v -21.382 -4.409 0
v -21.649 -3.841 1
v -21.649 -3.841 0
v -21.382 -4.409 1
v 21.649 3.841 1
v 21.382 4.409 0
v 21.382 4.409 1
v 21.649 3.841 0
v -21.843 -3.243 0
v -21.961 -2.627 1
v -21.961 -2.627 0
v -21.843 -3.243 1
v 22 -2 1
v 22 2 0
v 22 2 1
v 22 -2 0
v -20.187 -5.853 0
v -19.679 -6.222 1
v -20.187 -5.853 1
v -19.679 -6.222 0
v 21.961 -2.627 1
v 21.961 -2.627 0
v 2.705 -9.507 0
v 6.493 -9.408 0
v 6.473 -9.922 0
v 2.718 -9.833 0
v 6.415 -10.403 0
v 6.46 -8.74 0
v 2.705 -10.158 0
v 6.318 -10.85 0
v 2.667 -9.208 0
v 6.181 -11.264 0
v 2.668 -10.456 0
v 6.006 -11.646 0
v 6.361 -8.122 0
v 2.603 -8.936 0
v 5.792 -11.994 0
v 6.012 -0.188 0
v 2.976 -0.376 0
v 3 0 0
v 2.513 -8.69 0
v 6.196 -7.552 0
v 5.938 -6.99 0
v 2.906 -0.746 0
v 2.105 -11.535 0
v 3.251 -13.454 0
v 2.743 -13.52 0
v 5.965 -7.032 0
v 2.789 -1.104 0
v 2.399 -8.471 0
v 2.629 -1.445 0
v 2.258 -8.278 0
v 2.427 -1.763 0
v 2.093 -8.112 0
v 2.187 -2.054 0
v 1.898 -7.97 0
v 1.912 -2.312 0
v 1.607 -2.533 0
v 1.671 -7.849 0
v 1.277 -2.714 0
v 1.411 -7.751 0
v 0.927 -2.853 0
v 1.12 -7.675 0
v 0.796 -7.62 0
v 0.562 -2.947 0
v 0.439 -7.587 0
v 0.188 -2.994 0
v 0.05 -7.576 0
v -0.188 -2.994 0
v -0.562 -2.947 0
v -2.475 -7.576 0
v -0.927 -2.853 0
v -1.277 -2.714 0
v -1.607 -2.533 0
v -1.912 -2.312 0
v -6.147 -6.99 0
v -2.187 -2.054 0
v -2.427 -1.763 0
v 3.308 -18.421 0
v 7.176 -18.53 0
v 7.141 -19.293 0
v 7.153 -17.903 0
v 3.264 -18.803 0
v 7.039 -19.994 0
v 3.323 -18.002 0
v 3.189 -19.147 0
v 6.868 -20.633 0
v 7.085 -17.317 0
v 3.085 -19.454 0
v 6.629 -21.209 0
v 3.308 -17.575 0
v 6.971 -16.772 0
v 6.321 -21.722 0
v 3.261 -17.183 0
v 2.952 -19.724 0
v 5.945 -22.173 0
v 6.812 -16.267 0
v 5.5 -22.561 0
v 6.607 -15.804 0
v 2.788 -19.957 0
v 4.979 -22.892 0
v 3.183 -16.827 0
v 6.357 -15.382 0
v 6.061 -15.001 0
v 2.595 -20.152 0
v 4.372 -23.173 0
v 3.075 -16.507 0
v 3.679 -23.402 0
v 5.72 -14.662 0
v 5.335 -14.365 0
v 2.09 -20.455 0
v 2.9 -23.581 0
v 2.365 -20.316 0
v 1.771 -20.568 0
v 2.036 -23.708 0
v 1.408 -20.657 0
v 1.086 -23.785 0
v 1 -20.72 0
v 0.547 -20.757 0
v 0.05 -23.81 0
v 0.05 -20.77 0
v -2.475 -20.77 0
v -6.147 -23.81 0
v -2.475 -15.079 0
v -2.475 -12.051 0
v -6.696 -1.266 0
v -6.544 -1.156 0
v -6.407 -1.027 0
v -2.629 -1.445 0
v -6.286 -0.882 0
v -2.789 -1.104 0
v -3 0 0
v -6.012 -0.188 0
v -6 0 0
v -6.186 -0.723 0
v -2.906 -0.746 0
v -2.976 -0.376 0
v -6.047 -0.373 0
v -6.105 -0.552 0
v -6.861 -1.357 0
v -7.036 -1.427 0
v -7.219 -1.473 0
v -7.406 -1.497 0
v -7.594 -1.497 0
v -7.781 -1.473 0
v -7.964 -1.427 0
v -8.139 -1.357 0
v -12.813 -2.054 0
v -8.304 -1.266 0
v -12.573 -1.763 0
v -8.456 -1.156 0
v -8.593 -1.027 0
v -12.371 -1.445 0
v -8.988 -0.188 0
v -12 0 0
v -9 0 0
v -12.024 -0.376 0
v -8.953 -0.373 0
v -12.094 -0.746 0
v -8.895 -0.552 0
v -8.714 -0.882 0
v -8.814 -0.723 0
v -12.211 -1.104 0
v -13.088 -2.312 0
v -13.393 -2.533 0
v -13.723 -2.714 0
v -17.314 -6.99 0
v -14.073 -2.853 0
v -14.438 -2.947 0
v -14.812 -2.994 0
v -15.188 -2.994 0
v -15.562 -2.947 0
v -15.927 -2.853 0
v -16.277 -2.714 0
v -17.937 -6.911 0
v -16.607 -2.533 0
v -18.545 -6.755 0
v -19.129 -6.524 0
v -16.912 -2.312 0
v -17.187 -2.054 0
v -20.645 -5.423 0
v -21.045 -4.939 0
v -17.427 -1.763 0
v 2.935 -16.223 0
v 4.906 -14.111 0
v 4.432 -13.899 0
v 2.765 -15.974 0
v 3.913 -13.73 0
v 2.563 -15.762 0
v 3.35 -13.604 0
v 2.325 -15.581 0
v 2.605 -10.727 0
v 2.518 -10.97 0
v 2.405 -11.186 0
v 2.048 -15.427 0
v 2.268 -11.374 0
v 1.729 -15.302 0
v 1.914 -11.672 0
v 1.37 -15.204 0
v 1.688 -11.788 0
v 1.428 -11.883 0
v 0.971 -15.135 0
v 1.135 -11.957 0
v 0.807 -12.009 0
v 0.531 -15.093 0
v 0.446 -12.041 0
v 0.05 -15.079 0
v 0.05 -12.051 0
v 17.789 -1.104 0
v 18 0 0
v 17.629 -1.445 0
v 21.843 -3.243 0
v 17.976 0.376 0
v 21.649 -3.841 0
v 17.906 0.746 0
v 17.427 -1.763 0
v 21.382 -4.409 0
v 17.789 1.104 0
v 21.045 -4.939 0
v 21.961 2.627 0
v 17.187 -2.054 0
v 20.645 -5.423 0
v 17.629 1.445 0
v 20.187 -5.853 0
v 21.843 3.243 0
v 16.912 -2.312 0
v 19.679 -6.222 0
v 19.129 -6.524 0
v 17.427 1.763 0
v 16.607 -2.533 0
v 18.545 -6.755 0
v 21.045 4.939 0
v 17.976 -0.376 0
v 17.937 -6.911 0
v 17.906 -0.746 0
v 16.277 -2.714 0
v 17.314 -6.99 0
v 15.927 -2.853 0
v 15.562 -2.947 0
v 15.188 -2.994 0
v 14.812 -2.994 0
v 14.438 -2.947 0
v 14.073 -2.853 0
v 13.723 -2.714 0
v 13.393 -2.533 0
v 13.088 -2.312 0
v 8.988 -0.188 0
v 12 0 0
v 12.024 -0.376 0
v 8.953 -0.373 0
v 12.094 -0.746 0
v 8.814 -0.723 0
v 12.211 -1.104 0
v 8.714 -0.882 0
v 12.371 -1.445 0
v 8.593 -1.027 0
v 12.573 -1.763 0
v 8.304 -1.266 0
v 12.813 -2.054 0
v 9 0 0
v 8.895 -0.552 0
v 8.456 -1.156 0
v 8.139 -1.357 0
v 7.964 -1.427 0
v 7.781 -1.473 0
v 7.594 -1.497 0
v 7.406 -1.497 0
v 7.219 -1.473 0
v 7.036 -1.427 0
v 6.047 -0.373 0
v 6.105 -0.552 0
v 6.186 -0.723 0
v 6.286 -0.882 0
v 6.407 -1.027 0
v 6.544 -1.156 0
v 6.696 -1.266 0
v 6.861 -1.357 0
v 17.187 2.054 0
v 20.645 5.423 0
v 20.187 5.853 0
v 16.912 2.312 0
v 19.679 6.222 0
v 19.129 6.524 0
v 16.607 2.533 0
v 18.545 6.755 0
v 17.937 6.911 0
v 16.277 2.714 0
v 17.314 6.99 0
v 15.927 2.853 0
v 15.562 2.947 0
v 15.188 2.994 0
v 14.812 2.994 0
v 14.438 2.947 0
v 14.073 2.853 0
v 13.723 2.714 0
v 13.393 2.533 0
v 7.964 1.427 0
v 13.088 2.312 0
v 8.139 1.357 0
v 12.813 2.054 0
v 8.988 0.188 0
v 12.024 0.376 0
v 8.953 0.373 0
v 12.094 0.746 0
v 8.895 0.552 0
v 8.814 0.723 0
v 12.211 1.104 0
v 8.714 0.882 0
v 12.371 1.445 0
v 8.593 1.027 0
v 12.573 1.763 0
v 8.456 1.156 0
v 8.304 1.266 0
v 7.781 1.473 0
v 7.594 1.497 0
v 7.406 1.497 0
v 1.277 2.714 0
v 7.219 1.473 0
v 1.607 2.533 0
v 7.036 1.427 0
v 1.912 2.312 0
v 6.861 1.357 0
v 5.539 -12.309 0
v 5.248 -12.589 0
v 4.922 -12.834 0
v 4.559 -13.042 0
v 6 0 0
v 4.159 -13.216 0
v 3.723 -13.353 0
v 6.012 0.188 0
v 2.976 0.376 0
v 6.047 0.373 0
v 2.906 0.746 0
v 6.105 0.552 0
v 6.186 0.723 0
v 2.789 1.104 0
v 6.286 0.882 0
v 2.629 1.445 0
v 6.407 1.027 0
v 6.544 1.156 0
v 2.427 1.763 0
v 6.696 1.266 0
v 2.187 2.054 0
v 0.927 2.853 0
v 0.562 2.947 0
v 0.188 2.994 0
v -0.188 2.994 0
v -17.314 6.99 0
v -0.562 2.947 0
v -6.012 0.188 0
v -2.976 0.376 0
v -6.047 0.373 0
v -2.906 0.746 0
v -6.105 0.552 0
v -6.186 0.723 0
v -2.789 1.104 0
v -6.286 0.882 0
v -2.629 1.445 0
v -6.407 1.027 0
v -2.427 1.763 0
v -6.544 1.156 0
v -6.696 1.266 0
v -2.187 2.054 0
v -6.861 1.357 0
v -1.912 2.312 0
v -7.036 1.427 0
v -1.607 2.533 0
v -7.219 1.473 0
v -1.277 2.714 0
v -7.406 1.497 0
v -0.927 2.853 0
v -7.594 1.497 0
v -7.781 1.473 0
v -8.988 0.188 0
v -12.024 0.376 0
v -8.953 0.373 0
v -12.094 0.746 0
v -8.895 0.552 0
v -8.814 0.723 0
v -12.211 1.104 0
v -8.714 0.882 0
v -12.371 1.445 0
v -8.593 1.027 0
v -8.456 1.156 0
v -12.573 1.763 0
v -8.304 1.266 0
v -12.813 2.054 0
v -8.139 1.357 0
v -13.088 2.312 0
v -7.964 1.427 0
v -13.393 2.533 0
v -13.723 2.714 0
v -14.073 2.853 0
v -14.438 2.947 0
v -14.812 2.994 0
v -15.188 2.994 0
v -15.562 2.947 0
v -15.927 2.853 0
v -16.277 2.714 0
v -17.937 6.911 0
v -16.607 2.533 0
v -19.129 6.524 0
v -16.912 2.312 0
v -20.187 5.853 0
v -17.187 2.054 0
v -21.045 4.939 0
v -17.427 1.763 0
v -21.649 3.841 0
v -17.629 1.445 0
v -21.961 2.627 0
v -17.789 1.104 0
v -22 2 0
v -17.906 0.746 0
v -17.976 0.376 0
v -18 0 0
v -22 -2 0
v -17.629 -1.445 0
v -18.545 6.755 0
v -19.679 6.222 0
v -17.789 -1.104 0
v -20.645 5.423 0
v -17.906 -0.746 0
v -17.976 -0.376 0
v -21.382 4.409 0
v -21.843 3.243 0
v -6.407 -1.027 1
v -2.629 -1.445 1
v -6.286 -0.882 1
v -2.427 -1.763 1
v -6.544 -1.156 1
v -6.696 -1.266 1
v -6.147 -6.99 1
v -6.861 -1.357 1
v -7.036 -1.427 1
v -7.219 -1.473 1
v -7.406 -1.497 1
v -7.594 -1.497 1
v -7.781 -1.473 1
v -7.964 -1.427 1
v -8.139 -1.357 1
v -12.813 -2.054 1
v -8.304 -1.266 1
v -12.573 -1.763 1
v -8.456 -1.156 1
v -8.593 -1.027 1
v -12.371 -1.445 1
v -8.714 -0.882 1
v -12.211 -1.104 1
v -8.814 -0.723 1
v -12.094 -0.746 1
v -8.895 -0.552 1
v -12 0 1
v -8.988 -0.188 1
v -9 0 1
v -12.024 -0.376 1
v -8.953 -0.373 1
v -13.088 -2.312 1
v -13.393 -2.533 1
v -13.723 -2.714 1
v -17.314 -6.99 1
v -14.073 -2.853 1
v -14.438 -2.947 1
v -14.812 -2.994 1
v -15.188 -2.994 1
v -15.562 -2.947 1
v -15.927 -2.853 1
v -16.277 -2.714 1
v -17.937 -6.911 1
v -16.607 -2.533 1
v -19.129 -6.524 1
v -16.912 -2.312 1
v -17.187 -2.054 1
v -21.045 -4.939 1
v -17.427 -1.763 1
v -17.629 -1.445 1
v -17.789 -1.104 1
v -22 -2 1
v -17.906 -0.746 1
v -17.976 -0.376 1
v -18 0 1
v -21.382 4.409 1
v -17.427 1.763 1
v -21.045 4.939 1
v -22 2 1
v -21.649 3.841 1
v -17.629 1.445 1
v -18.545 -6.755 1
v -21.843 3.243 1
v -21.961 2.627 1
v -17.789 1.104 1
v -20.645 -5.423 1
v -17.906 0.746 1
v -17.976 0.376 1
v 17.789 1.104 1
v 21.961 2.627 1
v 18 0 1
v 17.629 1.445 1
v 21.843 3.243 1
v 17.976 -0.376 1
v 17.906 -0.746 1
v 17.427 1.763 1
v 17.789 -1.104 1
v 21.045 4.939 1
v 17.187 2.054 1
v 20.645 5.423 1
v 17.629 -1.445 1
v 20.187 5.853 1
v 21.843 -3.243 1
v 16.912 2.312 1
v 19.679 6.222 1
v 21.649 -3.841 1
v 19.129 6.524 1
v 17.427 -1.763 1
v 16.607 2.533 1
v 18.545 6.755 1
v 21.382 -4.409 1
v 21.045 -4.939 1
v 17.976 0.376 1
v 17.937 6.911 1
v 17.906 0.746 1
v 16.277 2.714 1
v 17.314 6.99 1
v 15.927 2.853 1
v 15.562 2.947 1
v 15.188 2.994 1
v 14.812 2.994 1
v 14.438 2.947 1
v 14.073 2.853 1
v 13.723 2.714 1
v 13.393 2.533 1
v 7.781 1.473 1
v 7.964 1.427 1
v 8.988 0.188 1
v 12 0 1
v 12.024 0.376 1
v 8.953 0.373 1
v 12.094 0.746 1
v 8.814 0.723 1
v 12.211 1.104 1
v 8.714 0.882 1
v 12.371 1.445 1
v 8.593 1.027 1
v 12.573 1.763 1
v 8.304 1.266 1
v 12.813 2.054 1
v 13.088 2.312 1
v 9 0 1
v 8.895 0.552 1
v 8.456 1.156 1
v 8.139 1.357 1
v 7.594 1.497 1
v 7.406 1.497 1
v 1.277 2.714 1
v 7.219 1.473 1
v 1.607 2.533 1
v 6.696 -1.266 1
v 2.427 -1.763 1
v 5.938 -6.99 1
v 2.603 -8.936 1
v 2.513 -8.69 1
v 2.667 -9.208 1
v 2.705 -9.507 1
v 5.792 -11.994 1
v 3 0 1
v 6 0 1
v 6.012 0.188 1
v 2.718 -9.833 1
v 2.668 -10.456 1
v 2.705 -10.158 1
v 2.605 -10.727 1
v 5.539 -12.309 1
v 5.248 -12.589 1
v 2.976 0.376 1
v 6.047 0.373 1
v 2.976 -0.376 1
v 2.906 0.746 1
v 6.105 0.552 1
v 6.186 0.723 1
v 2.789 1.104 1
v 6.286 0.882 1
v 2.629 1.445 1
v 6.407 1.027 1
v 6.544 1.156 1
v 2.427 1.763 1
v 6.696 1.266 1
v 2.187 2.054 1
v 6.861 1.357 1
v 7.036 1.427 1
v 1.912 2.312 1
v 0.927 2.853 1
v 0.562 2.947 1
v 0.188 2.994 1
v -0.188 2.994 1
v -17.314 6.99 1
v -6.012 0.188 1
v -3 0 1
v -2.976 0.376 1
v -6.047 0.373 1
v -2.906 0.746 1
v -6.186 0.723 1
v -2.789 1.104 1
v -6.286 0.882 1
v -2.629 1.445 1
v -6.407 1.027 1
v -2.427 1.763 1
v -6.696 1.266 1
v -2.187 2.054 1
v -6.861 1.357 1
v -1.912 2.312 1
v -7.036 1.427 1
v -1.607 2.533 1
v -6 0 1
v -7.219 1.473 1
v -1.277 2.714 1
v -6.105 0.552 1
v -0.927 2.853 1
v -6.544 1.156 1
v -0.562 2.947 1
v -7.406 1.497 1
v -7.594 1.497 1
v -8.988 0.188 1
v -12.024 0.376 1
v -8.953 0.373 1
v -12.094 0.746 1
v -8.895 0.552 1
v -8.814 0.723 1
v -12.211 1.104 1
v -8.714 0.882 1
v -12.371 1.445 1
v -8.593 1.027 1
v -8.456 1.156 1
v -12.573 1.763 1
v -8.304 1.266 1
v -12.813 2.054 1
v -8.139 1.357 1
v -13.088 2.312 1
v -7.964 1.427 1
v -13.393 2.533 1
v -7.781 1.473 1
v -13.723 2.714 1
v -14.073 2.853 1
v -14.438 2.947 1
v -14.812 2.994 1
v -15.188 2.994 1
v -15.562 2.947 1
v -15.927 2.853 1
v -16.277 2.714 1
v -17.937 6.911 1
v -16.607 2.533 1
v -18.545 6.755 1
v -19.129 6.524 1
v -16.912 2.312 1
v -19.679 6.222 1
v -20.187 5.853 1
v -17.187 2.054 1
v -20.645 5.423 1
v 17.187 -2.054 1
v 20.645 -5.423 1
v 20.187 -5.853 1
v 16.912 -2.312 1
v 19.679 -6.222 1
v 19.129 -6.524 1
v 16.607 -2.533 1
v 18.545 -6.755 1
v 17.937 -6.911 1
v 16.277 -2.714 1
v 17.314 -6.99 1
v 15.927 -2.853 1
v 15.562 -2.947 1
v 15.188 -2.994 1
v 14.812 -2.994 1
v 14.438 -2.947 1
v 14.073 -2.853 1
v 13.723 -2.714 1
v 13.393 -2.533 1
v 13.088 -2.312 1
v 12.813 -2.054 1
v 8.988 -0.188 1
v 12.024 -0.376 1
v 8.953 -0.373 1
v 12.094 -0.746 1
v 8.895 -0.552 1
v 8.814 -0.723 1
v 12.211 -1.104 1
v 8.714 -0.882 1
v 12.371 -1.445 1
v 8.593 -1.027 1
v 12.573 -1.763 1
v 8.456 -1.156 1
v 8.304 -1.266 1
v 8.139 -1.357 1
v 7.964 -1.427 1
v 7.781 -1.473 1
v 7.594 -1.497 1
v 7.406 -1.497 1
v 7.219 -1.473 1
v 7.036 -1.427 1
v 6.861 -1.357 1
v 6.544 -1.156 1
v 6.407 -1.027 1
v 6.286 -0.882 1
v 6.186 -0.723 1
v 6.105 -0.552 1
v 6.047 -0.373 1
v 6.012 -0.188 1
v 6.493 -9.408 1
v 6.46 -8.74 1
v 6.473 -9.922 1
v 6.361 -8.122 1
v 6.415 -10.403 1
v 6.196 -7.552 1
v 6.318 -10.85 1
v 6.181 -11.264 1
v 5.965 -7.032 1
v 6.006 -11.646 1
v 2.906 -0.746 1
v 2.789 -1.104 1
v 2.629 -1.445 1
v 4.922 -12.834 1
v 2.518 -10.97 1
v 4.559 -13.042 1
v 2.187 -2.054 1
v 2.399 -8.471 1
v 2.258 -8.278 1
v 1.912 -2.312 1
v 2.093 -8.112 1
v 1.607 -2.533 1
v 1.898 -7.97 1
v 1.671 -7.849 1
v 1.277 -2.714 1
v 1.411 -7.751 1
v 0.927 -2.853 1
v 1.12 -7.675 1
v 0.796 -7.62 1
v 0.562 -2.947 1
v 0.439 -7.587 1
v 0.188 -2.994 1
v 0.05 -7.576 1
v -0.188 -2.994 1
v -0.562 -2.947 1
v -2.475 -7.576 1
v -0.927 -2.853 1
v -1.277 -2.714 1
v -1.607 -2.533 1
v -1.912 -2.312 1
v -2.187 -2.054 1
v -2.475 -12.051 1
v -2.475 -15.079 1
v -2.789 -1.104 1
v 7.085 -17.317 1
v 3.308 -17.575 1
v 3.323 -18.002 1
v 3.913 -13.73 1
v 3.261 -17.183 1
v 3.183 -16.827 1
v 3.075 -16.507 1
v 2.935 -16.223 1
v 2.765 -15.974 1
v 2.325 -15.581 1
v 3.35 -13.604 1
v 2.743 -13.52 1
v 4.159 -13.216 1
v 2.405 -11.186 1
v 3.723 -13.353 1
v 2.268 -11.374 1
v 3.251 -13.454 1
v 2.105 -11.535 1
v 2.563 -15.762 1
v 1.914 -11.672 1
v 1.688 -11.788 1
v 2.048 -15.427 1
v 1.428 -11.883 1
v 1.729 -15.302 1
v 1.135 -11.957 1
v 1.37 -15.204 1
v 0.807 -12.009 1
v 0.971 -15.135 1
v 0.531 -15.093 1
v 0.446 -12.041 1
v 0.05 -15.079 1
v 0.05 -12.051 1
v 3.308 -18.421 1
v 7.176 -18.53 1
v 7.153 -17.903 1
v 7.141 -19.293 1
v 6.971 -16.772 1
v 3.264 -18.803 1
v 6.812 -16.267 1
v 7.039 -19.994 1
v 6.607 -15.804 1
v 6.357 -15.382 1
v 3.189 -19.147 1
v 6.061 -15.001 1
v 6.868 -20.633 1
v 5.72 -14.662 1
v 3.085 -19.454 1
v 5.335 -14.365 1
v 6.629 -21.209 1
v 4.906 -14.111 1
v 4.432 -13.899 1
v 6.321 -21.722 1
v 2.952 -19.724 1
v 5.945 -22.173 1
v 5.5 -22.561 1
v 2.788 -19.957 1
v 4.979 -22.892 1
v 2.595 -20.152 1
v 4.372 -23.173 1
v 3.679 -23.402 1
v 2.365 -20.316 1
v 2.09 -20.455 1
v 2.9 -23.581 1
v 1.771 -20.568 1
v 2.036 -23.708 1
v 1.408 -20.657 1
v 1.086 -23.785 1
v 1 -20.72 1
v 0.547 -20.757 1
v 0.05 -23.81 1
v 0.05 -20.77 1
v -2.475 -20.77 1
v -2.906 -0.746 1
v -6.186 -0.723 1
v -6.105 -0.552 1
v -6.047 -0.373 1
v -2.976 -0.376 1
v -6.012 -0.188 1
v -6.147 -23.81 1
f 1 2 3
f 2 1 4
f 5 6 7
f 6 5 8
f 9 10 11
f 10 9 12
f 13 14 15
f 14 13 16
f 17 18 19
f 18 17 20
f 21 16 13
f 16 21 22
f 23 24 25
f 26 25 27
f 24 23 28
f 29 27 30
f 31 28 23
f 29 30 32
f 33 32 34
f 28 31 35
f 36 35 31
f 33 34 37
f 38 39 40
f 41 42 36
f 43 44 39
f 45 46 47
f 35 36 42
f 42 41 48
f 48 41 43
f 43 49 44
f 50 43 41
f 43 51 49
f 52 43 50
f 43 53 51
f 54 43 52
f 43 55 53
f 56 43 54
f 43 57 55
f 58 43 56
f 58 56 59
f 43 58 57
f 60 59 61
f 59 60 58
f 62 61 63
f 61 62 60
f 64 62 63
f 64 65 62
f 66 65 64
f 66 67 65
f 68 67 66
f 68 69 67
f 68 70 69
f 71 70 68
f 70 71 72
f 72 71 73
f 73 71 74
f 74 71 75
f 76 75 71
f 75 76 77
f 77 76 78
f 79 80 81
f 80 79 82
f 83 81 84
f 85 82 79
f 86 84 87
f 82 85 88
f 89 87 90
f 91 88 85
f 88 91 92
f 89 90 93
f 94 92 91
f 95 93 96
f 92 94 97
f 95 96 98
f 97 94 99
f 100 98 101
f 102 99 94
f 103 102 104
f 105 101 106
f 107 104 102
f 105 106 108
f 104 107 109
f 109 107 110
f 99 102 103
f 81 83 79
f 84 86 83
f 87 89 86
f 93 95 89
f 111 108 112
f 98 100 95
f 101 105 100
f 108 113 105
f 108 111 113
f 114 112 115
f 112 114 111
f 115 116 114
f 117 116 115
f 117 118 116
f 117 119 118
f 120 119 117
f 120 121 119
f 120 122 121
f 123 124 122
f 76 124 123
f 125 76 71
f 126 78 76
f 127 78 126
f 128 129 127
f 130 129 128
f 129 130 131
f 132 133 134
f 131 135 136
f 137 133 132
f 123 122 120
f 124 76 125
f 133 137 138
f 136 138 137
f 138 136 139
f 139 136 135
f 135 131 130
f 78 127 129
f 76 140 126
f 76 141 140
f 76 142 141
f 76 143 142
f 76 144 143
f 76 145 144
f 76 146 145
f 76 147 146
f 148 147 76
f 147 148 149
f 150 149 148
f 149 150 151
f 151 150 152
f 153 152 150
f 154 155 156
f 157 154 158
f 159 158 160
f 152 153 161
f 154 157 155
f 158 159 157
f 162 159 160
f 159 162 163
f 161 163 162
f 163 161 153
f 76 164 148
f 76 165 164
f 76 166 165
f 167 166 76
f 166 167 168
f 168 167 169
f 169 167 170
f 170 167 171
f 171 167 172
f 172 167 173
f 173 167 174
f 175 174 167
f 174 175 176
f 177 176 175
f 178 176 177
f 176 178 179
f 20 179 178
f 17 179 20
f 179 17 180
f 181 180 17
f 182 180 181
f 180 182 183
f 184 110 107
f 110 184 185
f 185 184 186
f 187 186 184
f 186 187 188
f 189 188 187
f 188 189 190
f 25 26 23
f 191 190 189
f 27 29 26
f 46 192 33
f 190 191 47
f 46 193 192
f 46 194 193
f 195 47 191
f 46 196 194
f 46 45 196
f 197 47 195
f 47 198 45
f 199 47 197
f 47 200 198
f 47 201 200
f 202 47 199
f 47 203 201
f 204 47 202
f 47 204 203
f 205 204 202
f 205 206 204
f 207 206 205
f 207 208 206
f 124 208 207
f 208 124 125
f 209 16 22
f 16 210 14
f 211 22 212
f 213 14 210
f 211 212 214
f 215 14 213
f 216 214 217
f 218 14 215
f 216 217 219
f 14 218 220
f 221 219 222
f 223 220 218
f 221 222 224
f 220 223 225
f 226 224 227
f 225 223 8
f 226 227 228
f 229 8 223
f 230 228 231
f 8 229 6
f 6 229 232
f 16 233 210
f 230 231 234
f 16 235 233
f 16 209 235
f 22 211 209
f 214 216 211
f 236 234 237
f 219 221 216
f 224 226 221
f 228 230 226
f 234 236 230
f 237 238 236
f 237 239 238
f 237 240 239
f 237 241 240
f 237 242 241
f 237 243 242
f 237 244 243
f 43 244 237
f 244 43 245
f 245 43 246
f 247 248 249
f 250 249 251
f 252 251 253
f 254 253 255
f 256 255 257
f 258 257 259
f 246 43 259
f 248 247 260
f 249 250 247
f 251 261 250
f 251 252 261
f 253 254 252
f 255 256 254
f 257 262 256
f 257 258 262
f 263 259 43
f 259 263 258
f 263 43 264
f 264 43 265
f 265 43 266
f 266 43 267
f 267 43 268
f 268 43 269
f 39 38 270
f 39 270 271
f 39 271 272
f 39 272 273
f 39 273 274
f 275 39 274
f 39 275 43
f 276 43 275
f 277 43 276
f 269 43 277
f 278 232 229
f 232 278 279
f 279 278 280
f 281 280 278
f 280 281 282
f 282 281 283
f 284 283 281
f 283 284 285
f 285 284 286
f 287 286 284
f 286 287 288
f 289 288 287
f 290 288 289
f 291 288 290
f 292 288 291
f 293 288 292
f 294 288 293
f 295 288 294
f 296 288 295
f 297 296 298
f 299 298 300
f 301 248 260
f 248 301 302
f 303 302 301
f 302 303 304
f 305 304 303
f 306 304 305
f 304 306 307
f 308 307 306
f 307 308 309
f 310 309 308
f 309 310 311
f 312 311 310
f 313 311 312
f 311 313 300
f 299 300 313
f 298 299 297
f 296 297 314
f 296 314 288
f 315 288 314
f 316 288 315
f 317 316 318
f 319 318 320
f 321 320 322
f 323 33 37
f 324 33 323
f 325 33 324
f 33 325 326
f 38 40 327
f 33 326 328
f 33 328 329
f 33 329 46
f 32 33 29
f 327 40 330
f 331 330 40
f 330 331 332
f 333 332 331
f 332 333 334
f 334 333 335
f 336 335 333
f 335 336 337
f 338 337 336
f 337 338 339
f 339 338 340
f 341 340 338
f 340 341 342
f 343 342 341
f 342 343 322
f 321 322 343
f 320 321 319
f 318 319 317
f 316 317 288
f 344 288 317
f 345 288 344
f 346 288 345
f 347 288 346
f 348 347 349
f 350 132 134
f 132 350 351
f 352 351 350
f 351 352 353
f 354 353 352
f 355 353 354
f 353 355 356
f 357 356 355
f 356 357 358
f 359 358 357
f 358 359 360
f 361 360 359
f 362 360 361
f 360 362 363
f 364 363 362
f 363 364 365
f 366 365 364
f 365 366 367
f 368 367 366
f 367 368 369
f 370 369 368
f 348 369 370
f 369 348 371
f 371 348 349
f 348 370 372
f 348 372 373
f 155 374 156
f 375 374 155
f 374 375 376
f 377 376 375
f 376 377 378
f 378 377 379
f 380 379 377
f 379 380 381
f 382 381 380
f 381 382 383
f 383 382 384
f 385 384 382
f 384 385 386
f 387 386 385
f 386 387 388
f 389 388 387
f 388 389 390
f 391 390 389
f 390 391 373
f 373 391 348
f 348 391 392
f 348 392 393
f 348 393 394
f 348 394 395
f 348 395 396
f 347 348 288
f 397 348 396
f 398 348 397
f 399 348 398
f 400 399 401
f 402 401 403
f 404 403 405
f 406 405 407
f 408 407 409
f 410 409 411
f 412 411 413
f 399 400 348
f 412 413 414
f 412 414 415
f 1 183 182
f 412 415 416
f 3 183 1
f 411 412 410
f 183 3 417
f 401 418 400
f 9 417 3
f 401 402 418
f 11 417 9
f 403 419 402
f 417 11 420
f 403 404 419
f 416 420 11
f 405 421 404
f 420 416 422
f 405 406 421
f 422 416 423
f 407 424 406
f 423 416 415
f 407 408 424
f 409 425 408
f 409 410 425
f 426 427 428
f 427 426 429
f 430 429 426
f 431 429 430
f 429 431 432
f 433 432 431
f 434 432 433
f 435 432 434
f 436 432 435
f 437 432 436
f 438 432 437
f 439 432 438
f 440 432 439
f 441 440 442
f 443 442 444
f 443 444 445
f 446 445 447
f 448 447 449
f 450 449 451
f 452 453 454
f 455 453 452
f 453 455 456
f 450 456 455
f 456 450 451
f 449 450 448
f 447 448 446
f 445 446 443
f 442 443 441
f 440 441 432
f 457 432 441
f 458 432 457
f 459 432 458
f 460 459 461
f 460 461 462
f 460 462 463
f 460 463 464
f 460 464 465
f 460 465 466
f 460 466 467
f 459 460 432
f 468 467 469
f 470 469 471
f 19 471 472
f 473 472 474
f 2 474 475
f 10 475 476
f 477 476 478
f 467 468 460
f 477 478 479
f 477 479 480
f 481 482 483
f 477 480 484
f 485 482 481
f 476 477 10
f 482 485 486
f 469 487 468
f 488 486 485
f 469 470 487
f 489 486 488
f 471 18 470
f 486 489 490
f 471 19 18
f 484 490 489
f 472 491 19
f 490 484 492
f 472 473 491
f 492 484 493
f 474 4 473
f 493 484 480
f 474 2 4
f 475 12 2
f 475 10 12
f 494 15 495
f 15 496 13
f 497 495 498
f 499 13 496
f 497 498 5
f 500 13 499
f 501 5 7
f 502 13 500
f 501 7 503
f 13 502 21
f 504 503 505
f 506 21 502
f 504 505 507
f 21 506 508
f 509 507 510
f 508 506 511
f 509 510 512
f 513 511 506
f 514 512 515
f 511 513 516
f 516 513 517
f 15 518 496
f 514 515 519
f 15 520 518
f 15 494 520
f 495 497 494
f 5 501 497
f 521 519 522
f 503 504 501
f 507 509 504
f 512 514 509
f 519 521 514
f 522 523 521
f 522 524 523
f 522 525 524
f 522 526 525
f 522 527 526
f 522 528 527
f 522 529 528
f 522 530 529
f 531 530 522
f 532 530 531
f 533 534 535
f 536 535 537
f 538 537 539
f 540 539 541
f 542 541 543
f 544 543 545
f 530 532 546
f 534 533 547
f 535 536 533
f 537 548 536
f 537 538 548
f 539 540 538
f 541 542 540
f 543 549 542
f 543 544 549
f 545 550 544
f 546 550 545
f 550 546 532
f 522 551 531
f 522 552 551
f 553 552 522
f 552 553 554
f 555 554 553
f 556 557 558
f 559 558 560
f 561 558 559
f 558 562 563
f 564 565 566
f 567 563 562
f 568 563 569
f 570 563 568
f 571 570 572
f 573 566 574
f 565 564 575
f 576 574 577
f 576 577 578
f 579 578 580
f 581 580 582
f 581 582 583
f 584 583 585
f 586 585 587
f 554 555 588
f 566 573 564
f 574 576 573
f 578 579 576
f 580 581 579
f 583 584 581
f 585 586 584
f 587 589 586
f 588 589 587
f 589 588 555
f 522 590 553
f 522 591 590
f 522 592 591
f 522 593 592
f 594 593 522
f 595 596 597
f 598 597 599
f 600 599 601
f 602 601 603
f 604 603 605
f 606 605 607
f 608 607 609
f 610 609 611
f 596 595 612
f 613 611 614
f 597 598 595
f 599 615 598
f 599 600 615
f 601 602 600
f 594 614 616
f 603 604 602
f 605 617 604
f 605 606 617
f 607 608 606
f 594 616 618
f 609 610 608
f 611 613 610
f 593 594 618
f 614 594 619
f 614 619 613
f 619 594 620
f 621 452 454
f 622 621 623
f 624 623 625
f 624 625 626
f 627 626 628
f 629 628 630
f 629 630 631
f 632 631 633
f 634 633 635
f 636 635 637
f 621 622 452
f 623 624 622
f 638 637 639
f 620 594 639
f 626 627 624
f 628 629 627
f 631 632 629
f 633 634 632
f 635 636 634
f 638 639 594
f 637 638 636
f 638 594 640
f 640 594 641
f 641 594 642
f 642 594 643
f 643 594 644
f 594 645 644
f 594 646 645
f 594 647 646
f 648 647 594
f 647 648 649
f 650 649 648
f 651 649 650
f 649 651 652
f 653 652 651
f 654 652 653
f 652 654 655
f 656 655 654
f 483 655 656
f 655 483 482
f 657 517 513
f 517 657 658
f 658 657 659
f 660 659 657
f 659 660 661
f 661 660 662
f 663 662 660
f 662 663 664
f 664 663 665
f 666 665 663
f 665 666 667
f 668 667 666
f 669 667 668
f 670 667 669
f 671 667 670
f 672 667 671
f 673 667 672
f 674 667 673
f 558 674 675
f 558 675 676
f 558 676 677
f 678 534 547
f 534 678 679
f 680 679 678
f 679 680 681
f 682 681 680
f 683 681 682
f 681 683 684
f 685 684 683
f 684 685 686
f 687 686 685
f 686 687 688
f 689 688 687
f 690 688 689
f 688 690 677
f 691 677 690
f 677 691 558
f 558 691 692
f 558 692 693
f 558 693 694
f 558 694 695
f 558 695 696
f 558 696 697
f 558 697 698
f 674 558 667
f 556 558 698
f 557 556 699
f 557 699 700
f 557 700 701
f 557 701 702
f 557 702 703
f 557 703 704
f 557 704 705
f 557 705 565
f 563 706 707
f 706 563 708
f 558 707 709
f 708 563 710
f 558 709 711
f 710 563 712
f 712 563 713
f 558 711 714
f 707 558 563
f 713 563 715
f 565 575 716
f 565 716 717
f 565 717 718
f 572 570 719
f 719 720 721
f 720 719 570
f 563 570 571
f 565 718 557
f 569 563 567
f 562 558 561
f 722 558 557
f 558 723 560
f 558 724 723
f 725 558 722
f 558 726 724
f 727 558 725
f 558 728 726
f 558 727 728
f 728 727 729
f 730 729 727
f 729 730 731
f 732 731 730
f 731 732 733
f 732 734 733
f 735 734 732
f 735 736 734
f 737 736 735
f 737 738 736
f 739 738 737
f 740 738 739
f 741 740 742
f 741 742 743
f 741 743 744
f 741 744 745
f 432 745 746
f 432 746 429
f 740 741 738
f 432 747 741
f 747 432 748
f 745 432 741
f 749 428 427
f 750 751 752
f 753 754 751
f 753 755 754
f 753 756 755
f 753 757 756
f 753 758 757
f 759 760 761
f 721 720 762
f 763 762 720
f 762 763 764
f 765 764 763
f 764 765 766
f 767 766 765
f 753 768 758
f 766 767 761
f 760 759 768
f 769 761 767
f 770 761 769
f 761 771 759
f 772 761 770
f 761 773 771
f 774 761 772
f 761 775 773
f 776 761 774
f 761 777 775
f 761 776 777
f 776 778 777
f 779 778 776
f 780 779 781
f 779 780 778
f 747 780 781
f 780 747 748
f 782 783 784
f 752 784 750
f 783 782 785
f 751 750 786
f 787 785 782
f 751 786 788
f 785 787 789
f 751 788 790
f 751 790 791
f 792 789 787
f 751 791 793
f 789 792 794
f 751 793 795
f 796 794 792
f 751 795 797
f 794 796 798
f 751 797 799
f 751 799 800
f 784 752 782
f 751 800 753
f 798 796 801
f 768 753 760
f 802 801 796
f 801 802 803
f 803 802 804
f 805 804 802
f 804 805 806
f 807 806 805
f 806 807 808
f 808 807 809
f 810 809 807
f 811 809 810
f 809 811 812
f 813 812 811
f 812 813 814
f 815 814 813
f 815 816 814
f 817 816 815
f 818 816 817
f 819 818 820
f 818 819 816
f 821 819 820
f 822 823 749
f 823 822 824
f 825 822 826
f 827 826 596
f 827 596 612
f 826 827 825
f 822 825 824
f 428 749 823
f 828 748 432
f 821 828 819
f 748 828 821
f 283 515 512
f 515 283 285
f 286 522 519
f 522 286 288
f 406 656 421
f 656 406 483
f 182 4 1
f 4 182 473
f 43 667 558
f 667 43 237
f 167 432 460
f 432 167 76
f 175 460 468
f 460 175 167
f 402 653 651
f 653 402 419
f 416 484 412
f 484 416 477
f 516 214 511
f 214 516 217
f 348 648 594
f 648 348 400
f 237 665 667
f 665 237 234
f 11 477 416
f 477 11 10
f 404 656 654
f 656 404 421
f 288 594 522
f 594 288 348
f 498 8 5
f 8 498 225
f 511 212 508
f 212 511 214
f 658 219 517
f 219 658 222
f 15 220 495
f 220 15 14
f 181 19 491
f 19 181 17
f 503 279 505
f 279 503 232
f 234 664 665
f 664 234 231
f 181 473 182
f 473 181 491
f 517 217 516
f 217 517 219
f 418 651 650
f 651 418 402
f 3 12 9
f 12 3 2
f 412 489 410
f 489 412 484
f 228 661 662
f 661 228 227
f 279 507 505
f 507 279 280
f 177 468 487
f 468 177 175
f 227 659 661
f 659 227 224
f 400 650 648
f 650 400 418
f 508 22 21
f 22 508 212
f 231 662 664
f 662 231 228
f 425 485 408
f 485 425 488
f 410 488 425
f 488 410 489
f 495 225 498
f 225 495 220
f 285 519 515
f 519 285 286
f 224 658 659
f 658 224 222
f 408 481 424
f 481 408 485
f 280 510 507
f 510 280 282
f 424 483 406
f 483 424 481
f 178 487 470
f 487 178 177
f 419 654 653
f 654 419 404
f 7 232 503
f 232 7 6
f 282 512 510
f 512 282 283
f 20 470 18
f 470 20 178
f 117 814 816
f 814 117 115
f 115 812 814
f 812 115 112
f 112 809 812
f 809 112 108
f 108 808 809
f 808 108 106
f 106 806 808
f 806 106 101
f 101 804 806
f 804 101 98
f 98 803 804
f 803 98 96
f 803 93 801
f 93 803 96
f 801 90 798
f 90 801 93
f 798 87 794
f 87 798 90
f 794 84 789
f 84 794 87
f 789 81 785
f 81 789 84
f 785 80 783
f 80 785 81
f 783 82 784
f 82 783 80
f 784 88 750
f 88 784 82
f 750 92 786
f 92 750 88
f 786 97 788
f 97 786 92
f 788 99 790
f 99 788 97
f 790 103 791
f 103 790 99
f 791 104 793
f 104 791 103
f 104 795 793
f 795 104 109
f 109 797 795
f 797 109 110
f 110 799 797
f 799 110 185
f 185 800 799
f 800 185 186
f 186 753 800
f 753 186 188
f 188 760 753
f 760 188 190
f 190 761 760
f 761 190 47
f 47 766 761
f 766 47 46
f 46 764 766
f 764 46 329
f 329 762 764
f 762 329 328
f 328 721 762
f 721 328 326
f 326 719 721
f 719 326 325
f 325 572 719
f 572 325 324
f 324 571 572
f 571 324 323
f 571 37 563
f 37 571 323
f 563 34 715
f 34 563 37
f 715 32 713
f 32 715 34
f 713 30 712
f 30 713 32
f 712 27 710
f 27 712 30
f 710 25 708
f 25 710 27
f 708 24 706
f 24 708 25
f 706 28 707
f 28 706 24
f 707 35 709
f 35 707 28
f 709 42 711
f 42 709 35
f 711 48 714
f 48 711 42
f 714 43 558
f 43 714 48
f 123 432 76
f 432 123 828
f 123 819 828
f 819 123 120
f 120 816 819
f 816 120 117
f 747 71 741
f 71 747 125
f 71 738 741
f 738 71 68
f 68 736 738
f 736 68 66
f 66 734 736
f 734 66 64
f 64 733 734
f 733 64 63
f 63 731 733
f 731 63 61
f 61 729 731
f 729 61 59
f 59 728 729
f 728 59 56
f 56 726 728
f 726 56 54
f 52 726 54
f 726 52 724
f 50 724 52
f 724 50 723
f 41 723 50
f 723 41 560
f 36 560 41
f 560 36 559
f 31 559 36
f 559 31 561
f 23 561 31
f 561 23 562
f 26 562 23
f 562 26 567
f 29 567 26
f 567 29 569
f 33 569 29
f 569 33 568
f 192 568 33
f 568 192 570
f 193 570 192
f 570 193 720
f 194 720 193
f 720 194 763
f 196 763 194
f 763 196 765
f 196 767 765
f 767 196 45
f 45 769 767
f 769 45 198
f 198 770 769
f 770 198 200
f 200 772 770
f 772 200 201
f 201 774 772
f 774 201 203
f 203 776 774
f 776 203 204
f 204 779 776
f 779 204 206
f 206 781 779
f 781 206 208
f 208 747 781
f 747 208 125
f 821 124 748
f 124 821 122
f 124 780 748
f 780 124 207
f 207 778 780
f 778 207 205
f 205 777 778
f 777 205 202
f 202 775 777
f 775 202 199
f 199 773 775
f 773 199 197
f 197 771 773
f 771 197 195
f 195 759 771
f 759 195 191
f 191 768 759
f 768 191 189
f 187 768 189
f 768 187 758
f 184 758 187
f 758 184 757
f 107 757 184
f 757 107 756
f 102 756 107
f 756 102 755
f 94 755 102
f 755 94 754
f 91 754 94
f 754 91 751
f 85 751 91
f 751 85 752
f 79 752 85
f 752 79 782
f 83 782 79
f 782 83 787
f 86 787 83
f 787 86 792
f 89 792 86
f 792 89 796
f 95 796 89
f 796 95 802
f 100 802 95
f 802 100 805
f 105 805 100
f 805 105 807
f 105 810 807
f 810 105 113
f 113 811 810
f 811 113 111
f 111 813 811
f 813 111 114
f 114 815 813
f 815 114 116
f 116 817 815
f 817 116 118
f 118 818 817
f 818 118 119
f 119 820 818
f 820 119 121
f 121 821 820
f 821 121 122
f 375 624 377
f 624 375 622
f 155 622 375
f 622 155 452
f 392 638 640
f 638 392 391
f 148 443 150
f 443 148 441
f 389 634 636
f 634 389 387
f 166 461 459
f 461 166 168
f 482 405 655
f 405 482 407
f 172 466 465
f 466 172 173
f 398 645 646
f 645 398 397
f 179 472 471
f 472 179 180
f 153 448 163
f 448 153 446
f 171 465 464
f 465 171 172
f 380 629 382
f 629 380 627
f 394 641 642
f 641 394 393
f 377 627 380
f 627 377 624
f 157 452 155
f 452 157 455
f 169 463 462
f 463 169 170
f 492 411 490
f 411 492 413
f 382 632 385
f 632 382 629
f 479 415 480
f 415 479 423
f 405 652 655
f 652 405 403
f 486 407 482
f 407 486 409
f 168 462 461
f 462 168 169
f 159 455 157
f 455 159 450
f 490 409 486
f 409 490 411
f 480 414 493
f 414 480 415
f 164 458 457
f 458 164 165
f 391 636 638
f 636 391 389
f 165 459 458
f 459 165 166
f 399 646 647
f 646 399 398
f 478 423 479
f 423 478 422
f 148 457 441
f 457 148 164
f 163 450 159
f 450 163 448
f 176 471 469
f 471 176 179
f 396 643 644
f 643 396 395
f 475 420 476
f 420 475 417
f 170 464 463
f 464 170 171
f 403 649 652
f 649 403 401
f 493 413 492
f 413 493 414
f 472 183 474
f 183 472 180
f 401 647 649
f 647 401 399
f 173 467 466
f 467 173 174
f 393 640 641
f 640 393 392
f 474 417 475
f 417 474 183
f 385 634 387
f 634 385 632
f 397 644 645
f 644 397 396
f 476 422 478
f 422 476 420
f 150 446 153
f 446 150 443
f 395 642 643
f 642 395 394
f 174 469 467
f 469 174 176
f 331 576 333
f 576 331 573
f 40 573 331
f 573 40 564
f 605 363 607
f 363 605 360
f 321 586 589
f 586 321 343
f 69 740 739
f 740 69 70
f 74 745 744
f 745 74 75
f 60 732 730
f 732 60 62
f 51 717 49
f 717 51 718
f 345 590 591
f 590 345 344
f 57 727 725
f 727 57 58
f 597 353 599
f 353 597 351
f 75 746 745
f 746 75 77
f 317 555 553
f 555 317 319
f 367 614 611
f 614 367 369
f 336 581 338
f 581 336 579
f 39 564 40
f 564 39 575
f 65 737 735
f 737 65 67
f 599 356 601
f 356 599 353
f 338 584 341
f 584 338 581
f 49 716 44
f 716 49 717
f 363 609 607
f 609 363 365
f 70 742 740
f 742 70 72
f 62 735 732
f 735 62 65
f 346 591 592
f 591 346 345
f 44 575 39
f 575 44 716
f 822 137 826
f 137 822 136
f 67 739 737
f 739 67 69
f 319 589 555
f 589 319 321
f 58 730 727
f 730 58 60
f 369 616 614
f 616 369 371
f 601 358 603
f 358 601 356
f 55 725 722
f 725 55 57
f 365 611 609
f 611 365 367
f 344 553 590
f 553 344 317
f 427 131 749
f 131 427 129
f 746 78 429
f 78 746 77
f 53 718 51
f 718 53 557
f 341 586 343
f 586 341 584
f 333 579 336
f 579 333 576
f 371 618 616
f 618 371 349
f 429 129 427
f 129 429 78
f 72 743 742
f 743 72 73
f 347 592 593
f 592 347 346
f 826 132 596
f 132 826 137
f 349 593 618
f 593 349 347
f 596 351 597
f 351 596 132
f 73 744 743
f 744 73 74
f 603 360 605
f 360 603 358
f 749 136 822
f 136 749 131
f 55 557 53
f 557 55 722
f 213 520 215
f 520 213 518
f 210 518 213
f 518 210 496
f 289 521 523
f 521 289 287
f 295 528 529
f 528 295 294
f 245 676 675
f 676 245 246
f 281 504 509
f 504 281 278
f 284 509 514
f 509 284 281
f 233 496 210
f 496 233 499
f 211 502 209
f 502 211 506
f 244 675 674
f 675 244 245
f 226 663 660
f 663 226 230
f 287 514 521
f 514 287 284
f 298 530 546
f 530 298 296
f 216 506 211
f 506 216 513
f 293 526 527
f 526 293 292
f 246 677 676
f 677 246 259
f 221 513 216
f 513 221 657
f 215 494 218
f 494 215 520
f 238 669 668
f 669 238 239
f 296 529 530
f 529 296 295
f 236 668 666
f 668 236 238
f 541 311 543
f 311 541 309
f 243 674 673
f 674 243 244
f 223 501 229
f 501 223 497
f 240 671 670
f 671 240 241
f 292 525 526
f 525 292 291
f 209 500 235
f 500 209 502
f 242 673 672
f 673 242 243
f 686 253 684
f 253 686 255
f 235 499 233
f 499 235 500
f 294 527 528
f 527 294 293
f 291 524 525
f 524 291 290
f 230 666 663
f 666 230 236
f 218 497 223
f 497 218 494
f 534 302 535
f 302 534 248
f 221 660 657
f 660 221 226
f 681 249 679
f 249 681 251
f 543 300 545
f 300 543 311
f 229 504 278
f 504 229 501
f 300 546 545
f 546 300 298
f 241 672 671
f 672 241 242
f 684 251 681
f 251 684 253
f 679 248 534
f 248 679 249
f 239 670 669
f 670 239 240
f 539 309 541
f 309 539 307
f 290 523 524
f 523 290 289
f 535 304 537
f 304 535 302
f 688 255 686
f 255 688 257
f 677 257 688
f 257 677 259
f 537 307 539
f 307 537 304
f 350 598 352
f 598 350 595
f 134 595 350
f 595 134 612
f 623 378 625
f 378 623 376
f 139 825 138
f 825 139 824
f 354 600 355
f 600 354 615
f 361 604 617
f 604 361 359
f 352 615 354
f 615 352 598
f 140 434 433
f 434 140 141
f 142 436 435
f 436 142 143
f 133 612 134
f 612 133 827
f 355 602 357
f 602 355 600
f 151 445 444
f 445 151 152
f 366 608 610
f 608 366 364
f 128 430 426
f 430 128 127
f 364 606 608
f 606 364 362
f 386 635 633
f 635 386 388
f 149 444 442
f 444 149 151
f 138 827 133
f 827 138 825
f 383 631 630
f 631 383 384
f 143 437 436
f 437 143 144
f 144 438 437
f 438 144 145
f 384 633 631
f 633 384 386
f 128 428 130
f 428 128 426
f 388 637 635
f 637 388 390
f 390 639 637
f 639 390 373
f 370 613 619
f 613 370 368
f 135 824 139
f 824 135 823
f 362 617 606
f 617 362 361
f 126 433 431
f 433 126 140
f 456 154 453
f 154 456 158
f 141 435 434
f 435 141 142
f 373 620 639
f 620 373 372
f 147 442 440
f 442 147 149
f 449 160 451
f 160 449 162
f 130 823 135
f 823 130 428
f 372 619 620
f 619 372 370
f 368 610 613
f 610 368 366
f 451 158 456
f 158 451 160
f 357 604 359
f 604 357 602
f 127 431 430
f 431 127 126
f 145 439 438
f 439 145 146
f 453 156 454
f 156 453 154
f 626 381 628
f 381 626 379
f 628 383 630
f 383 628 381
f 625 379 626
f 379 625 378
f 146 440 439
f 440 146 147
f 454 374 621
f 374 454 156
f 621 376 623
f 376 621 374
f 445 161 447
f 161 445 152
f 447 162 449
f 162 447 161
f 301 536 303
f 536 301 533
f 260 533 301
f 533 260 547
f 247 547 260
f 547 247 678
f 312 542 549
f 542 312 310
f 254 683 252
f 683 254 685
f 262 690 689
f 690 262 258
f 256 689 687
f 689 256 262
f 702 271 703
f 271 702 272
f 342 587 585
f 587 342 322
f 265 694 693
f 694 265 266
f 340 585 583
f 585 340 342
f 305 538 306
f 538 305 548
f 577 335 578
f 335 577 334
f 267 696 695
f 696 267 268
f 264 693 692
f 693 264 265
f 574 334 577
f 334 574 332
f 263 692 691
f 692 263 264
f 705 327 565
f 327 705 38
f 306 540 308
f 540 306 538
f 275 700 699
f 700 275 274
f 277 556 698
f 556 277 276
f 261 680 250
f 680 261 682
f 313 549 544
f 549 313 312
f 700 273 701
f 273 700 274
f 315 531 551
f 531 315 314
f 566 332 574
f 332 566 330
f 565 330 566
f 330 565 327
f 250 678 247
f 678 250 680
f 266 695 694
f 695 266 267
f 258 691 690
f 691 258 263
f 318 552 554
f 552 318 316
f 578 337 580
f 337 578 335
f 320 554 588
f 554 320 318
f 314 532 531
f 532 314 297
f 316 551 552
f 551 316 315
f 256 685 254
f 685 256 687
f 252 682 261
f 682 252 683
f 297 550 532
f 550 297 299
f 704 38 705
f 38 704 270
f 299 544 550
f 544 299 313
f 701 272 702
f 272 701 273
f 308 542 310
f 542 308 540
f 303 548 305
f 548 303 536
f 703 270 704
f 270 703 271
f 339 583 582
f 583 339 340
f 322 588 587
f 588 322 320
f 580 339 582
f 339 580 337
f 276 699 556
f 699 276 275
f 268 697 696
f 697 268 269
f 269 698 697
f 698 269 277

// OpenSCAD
$fn = 50;


difference() {
	union() {
		hull() {
			translate(v = [-17.0000000000, 2.0000000000, 0]) {
				cylinder(h = 1, r = 5);
			}
			translate(v = [17.0000000000, 2.0000000000, 0]) {
				cylinder(h = 1, r = 5);
			}
			translate(v = [-17.0000000000, -2.0000000000, 0]) {
				cylinder(h = 1, r = 5);
			}
			translate(v = [17.0000000000, -2.0000000000, 0]) {
				cylinder(h = 1, r = 5);
			}
		}
		translate(v = [0, -5, 0]) {
			linear_extrude(height = 1) {
				text(font = "DejaVu Sans Mono:style=Bold", halign = "center", size = 19.0000000000, text = "B", valign = "top");
			}
		}
	}
	union() {
		translate(v = [-15.0000000000, 0.0000000000, 0]) {
			translate(v = [0, 0, -100]) {
				cylinder(h = 200, r = 3.0000000000);
			}
		}
		translate(v = [0, 0, -100]) {
			cylinder(h = 200, r = 3.0000000000);
		}
		translate(v = [15.0000000000, 0.0000000000, 0]) {
			translate(v = [0, 0, -100]) {
				cylinder(h = 200, r = 3.0000000000);
			}
		}
		translate(v = [-15.0000000000, 0.0000000000, 0]) {
			translate(v = [0, 0, -100]) {
				cylinder(h = 200, r = 1.5000000000);
			}
		}
		translate(v = [-7.5000000000, 0.0000000000, 0]) {
			translate(v = [0, 0, -100]) {
				cylinder(h = 200, r = 1.5000000000);
			}
		}
		translate(v = [0, 0, -100]) {
			cylinder(h = 200, r = 1.5000000000);
		}
		translate(v = [7.5000000000, 0.0000000000, 0]) {
			translate(v = [0, 0, -100]) {
				cylinder(h = 200, r = 1.5000000000);
			}
		}
		translate(v = [15.0000000000, 0.0000000000, 0]) {
			translate(v = [0, 0, -100]) {
				cylinder(h = 200, r = 1.5000000000);
			}
		}
	}
}
